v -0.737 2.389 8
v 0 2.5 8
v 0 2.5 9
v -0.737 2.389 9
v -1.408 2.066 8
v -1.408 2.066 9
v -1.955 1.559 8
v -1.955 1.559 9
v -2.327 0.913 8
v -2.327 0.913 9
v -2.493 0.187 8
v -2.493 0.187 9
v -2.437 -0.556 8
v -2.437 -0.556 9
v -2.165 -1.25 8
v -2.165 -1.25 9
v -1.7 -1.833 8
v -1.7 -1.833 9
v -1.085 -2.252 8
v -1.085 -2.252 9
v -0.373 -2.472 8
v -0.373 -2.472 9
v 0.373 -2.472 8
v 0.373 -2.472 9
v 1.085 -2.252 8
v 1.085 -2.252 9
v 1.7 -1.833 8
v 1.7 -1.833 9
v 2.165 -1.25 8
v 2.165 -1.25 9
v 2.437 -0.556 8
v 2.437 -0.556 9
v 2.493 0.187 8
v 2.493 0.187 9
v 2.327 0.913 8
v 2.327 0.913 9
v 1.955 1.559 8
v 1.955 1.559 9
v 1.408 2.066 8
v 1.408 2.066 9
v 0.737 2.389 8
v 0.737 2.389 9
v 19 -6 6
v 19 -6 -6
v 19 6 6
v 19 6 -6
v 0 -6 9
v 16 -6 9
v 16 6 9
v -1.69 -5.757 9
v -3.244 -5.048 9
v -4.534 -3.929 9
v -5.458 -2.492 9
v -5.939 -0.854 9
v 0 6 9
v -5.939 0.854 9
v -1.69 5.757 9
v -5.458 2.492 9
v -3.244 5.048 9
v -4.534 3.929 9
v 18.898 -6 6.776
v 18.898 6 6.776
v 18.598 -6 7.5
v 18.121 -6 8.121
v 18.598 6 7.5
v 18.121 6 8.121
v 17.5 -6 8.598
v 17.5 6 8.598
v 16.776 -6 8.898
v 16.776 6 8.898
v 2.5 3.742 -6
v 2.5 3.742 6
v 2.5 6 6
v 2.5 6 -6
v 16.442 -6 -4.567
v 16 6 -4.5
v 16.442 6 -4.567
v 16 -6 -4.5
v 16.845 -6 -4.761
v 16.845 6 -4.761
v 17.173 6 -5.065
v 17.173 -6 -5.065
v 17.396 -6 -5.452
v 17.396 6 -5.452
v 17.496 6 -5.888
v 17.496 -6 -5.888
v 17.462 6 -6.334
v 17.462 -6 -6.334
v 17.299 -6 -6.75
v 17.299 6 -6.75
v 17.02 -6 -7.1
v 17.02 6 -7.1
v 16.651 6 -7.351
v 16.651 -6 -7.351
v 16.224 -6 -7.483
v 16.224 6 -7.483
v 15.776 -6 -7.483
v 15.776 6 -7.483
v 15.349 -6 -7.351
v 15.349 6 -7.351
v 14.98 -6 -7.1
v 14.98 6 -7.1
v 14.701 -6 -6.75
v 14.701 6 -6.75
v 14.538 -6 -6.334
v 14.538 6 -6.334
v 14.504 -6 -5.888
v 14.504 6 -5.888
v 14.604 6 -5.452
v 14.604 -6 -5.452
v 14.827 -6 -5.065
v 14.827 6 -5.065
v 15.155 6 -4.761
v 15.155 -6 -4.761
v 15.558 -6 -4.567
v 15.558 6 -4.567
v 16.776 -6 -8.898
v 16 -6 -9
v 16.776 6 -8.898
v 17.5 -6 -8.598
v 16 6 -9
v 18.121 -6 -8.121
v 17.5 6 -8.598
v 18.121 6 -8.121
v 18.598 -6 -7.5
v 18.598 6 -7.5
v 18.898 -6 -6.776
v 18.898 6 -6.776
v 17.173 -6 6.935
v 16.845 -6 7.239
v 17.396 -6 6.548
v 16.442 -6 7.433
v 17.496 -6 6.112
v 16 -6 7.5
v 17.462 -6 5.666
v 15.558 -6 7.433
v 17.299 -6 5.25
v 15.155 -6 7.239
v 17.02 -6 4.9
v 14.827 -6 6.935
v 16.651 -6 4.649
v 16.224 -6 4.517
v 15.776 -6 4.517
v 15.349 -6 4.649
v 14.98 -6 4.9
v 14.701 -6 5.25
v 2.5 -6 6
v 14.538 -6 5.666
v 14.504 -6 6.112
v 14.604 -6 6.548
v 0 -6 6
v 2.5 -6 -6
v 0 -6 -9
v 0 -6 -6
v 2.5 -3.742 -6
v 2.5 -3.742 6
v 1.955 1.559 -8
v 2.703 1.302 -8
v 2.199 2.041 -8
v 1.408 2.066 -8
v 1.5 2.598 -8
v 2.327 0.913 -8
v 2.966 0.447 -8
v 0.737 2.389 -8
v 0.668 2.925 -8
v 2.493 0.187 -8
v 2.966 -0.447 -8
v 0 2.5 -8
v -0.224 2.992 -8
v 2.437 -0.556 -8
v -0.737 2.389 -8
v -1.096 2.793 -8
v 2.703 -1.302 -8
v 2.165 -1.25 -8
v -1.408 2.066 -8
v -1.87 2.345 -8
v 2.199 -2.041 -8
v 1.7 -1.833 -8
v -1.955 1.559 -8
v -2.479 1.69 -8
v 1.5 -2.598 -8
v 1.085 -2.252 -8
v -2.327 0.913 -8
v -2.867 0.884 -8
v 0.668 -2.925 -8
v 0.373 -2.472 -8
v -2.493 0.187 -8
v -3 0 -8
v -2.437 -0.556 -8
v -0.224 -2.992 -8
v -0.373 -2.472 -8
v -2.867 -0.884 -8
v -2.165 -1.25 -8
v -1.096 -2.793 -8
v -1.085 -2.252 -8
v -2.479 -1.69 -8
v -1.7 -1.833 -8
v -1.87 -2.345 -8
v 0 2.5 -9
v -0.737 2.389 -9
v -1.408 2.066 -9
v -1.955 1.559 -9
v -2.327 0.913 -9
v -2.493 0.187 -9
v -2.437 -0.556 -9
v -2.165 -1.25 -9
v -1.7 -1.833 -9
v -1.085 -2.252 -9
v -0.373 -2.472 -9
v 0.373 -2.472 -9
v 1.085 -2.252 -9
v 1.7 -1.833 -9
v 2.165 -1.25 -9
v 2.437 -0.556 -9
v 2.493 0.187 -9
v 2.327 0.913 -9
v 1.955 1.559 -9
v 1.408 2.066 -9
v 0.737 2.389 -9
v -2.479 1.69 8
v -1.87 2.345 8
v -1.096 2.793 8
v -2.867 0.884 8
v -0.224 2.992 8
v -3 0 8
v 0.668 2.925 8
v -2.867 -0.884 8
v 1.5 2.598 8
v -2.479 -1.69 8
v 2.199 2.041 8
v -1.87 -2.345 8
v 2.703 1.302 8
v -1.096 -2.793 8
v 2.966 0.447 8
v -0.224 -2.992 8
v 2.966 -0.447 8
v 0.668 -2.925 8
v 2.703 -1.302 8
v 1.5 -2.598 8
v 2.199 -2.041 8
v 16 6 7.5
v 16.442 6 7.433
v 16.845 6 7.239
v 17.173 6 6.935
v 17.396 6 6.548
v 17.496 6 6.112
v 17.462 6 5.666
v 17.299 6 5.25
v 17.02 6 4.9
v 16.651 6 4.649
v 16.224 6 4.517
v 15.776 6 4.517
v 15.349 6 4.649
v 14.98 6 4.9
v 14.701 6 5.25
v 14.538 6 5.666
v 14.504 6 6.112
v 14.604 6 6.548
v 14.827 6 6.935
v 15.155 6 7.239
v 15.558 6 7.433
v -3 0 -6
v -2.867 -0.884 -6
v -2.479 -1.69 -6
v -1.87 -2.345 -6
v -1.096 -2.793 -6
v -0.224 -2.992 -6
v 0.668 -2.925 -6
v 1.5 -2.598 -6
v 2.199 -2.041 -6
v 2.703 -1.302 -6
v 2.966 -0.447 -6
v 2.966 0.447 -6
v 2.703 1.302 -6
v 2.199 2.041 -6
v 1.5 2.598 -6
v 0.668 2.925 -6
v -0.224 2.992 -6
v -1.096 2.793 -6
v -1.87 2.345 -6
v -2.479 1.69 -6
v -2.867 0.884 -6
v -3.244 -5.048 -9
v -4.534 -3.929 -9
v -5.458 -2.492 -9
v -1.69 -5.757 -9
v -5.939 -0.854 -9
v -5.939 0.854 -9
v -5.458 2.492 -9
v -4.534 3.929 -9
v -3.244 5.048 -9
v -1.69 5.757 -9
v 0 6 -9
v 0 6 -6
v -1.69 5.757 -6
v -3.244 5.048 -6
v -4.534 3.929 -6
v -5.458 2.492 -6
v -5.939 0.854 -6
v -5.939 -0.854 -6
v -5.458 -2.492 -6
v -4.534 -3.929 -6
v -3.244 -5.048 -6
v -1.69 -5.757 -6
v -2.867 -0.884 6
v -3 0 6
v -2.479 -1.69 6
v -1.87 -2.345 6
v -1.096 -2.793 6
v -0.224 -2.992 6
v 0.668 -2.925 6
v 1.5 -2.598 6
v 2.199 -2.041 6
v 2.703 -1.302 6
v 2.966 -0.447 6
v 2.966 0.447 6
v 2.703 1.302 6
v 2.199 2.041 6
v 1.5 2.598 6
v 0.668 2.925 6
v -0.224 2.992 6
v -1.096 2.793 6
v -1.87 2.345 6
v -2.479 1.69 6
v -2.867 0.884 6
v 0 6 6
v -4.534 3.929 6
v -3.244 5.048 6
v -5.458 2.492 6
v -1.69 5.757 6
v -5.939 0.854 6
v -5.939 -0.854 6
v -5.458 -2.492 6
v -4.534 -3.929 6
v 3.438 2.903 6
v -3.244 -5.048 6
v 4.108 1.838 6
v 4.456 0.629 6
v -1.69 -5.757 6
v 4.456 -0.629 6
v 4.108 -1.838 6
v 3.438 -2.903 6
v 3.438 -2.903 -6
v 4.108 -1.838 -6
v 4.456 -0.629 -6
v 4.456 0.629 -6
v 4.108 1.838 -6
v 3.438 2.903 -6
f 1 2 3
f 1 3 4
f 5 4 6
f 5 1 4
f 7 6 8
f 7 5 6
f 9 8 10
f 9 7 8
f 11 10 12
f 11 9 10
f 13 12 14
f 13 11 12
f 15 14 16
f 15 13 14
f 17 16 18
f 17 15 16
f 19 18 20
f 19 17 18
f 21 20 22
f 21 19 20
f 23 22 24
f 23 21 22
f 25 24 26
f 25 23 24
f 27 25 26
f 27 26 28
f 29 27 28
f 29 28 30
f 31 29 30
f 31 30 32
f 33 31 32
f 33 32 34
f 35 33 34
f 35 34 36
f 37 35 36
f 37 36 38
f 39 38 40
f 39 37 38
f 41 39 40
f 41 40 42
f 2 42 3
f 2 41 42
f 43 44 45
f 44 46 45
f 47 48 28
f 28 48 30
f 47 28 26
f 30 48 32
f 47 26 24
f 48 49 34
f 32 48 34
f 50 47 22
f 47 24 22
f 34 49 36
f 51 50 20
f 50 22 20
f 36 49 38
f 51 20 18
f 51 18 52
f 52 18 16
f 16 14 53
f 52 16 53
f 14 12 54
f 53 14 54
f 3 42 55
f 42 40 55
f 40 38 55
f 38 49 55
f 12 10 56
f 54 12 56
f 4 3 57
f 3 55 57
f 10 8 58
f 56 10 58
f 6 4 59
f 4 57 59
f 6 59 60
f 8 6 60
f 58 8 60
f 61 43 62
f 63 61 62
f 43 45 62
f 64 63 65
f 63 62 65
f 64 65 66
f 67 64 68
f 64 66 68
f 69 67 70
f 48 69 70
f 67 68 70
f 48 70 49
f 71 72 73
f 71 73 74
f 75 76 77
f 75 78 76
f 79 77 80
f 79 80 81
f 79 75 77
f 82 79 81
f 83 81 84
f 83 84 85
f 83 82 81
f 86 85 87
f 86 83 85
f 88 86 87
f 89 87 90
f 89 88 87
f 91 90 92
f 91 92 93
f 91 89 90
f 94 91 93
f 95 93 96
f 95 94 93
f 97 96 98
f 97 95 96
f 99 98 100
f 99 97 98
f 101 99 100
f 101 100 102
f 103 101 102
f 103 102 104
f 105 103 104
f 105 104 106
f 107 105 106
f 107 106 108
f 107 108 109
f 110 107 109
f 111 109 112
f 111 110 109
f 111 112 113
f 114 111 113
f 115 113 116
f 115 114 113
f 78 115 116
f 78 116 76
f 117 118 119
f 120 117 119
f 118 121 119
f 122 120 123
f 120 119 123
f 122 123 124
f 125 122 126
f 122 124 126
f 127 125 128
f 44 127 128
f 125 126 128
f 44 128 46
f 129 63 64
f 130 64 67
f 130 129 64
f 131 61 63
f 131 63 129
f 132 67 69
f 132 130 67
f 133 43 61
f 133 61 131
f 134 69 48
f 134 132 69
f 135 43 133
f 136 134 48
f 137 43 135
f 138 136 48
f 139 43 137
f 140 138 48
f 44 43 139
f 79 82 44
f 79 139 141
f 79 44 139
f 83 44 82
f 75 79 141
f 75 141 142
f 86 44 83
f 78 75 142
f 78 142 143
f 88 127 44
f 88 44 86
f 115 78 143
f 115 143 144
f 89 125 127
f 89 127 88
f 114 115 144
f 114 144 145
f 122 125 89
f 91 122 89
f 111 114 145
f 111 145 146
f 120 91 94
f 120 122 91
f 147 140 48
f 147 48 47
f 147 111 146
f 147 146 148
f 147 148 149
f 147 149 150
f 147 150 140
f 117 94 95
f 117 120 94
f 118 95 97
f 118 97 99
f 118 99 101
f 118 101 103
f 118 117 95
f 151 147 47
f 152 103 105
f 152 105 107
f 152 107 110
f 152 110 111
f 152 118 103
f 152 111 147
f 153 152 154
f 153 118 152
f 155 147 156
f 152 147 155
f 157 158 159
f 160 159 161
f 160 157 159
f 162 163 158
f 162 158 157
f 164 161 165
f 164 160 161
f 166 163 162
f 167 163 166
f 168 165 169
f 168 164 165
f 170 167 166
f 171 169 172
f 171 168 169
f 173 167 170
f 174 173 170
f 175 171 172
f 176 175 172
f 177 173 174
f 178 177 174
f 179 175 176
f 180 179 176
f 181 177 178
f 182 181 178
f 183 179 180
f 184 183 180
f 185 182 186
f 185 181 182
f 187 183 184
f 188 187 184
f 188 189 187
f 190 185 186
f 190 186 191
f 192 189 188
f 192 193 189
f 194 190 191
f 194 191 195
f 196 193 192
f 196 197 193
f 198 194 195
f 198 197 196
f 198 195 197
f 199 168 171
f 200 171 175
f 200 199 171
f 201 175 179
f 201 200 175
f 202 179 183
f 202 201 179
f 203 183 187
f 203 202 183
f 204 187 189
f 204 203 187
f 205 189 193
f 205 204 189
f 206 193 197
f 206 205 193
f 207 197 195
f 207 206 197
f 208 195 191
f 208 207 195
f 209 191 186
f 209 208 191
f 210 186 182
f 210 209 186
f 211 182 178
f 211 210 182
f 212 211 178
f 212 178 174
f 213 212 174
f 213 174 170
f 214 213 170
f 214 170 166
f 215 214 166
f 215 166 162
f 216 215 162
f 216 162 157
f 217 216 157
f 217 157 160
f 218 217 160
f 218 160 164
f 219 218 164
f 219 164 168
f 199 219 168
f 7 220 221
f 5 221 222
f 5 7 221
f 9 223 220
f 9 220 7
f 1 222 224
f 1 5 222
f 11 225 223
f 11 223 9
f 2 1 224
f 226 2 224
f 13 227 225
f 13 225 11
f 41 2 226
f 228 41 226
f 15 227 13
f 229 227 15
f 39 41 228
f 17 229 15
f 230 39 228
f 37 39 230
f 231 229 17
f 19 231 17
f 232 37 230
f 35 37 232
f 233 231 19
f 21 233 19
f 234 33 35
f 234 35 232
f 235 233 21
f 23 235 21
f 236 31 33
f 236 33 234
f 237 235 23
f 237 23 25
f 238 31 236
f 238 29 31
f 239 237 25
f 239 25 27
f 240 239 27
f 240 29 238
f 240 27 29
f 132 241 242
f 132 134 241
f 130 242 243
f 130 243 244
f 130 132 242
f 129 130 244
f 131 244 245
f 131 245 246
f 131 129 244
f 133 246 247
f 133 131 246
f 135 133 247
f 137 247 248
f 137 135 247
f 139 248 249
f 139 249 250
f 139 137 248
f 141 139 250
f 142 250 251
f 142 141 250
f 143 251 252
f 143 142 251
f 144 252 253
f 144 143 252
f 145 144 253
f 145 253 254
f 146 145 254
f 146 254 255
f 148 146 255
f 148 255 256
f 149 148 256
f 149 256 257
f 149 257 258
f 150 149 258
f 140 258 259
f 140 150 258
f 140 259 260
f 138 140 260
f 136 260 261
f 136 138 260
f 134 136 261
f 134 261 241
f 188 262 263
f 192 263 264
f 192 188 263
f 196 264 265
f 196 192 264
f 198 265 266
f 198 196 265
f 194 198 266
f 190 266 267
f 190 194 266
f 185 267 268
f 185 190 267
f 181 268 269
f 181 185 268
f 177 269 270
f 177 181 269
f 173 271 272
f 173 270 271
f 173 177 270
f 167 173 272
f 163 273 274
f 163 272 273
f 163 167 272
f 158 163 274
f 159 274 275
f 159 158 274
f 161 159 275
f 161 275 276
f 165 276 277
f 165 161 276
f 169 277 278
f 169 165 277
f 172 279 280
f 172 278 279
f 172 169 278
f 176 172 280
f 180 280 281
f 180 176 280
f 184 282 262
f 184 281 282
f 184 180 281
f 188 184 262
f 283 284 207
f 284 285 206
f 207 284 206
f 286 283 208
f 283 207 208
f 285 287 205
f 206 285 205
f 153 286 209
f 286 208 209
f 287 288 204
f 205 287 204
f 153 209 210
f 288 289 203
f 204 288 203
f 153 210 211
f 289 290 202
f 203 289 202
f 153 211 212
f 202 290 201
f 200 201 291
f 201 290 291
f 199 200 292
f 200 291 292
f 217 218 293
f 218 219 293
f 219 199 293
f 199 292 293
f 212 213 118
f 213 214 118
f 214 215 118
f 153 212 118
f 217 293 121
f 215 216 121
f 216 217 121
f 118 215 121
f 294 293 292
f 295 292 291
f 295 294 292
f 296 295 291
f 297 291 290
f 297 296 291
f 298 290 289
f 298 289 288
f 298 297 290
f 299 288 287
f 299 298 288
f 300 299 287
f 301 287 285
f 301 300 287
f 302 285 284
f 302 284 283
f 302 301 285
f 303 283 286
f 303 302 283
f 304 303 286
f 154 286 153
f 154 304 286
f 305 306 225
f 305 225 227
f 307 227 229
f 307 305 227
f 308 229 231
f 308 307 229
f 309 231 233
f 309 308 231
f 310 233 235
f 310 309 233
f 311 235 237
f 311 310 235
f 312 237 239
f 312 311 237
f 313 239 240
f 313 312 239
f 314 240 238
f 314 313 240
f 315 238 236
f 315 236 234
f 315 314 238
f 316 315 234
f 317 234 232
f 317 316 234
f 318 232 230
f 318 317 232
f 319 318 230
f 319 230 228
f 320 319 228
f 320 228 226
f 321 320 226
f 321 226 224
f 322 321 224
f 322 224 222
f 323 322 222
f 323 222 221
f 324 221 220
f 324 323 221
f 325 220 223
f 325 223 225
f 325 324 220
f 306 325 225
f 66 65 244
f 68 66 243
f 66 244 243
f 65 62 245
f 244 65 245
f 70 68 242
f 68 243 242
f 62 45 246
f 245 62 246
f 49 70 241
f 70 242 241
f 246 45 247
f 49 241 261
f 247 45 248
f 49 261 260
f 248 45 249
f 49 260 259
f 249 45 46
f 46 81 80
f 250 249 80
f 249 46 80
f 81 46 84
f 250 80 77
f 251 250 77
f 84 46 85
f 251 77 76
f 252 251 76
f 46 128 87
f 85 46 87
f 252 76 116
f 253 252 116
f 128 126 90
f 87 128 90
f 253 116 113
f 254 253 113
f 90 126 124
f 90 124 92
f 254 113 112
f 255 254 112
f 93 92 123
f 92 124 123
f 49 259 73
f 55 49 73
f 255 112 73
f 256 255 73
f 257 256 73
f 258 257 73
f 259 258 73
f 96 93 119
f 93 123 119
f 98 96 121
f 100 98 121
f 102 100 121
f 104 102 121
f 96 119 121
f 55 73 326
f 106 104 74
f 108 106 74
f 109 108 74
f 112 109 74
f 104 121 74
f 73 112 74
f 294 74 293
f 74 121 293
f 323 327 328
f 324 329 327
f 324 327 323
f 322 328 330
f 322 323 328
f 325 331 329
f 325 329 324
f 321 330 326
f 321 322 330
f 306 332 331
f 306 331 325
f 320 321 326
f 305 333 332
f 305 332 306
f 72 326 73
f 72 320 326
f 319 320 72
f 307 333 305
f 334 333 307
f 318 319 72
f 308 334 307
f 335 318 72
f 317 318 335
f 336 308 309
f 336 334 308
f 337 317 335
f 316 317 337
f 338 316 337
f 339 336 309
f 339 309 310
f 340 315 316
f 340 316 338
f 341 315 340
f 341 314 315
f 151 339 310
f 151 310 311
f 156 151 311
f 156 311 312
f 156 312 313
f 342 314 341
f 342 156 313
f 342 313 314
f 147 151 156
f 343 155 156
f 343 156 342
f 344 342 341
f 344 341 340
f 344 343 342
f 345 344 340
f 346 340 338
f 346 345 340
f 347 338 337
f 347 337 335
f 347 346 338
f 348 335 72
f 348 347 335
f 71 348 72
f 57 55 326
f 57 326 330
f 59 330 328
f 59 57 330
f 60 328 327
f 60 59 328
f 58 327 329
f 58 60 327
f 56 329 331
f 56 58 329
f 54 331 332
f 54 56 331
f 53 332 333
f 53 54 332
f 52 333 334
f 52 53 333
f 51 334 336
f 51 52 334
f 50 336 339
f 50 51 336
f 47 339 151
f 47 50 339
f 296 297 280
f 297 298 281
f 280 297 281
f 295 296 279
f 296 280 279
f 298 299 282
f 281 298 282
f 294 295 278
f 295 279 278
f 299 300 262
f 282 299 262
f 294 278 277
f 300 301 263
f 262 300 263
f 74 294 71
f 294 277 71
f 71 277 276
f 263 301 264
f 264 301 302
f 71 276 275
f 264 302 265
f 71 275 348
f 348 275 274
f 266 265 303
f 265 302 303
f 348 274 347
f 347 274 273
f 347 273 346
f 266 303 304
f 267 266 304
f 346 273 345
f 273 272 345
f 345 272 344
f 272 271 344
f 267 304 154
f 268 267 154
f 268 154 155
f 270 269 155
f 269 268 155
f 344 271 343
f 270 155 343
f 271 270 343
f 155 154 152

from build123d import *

# Parameters (mm, degrees)
SKETCH1_R               = 6
SKETCH1_R_2             = 2.5
BOSS_EXTRUDE1_DEPTH     = 9
SKETCH2_R               = 1.5
BOSS_EXTRUDE2_DEPTH     = 6
CUT_EXTRUDE2_DEPTH      = 22.863211109
CUT_EXTRUDE2_DEPTH_BACK = 22.863211109
SKETCH5_W               = 8.5
SKETCH5_H               = 12


with BuildPart() as part:
    # Sketch1 → Boss-Extrude1 (new, symmetric)
    with BuildSketch(Plane.XY):
        Circle(SKETCH1_R)
        Circle(SKETCH1_R_2, mode=Mode.SUBTRACT)
    extrude(amount=BOSS_EXTRUDE1_DEPTH, both=True)

    # Sketch2 → Boss-Extrude2 (add, symmetric)
    with BuildSketch(Plane(origin=(0, 0, 0), x_dir=(1, 0, 0), z_dir=(0, 1, 0))):
        with BuildLine():
            Line((0, 9), (16, 9))
            ThreePointArc((16, 9), (18.121320344, 8.121320344), (19, 6))
            Line((19, 6), (19, -6))
            ThreePointArc((19, -6), (18.121320344, -8.121320344), (16, -9))
            Line((16, -9), (0, -9))
            Line((0, -9), (0, 9))
        make_face()
        with Locations((16, 6)):
            Circle(SKETCH2_R, mode=Mode.SUBTRACT)
        with Locations((16, -6)):
            Circle(SKETCH2_R, mode=Mode.SUBTRACT)
    extrude(amount=BOSS_EXTRUDE2_DEPTH, both=True)

    # Sketch3 → Cut-Revolve1 (revolve, cut)
    with BuildSketch(Plane(origin=(0, 0, 0), x_dir=(1, 0, 0), z_dir=(0, 1, 0))):
        Polygon((2.5, 8), (2.5, 9), (0, 9), (0, -9), (2.5, -9), (2.5, -8), (3, -8), (3, -6), (4.5, -6), (4.5, 6), (3, 6), (3, 8), align=None)
    revolve(axis=Axis((0, 0, -12.234149704), (0, 0, 1)), mode=Mode.SUBTRACT)

    # Sketch5 → Cut-Extrude2 (cut, two sides: drawn at the far end of the back side and taken through both)
    with BuildSketch(Plane(origin=(0, 0, 0), x_dir=(1, 0, 0), z_dir=(0, 1, 0)).offset(-CUT_EXTRUDE2_DEPTH_BACK)):
        with Locations((-1.75, 0)):
            Rectangle(SKETCH5_W, SKETCH5_H)
    extrude(amount=CUT_EXTRUDE2_DEPTH + CUT_EXTRUDE2_DEPTH_BACK, mode=Mode.SUBTRACT)


solid = part.part
